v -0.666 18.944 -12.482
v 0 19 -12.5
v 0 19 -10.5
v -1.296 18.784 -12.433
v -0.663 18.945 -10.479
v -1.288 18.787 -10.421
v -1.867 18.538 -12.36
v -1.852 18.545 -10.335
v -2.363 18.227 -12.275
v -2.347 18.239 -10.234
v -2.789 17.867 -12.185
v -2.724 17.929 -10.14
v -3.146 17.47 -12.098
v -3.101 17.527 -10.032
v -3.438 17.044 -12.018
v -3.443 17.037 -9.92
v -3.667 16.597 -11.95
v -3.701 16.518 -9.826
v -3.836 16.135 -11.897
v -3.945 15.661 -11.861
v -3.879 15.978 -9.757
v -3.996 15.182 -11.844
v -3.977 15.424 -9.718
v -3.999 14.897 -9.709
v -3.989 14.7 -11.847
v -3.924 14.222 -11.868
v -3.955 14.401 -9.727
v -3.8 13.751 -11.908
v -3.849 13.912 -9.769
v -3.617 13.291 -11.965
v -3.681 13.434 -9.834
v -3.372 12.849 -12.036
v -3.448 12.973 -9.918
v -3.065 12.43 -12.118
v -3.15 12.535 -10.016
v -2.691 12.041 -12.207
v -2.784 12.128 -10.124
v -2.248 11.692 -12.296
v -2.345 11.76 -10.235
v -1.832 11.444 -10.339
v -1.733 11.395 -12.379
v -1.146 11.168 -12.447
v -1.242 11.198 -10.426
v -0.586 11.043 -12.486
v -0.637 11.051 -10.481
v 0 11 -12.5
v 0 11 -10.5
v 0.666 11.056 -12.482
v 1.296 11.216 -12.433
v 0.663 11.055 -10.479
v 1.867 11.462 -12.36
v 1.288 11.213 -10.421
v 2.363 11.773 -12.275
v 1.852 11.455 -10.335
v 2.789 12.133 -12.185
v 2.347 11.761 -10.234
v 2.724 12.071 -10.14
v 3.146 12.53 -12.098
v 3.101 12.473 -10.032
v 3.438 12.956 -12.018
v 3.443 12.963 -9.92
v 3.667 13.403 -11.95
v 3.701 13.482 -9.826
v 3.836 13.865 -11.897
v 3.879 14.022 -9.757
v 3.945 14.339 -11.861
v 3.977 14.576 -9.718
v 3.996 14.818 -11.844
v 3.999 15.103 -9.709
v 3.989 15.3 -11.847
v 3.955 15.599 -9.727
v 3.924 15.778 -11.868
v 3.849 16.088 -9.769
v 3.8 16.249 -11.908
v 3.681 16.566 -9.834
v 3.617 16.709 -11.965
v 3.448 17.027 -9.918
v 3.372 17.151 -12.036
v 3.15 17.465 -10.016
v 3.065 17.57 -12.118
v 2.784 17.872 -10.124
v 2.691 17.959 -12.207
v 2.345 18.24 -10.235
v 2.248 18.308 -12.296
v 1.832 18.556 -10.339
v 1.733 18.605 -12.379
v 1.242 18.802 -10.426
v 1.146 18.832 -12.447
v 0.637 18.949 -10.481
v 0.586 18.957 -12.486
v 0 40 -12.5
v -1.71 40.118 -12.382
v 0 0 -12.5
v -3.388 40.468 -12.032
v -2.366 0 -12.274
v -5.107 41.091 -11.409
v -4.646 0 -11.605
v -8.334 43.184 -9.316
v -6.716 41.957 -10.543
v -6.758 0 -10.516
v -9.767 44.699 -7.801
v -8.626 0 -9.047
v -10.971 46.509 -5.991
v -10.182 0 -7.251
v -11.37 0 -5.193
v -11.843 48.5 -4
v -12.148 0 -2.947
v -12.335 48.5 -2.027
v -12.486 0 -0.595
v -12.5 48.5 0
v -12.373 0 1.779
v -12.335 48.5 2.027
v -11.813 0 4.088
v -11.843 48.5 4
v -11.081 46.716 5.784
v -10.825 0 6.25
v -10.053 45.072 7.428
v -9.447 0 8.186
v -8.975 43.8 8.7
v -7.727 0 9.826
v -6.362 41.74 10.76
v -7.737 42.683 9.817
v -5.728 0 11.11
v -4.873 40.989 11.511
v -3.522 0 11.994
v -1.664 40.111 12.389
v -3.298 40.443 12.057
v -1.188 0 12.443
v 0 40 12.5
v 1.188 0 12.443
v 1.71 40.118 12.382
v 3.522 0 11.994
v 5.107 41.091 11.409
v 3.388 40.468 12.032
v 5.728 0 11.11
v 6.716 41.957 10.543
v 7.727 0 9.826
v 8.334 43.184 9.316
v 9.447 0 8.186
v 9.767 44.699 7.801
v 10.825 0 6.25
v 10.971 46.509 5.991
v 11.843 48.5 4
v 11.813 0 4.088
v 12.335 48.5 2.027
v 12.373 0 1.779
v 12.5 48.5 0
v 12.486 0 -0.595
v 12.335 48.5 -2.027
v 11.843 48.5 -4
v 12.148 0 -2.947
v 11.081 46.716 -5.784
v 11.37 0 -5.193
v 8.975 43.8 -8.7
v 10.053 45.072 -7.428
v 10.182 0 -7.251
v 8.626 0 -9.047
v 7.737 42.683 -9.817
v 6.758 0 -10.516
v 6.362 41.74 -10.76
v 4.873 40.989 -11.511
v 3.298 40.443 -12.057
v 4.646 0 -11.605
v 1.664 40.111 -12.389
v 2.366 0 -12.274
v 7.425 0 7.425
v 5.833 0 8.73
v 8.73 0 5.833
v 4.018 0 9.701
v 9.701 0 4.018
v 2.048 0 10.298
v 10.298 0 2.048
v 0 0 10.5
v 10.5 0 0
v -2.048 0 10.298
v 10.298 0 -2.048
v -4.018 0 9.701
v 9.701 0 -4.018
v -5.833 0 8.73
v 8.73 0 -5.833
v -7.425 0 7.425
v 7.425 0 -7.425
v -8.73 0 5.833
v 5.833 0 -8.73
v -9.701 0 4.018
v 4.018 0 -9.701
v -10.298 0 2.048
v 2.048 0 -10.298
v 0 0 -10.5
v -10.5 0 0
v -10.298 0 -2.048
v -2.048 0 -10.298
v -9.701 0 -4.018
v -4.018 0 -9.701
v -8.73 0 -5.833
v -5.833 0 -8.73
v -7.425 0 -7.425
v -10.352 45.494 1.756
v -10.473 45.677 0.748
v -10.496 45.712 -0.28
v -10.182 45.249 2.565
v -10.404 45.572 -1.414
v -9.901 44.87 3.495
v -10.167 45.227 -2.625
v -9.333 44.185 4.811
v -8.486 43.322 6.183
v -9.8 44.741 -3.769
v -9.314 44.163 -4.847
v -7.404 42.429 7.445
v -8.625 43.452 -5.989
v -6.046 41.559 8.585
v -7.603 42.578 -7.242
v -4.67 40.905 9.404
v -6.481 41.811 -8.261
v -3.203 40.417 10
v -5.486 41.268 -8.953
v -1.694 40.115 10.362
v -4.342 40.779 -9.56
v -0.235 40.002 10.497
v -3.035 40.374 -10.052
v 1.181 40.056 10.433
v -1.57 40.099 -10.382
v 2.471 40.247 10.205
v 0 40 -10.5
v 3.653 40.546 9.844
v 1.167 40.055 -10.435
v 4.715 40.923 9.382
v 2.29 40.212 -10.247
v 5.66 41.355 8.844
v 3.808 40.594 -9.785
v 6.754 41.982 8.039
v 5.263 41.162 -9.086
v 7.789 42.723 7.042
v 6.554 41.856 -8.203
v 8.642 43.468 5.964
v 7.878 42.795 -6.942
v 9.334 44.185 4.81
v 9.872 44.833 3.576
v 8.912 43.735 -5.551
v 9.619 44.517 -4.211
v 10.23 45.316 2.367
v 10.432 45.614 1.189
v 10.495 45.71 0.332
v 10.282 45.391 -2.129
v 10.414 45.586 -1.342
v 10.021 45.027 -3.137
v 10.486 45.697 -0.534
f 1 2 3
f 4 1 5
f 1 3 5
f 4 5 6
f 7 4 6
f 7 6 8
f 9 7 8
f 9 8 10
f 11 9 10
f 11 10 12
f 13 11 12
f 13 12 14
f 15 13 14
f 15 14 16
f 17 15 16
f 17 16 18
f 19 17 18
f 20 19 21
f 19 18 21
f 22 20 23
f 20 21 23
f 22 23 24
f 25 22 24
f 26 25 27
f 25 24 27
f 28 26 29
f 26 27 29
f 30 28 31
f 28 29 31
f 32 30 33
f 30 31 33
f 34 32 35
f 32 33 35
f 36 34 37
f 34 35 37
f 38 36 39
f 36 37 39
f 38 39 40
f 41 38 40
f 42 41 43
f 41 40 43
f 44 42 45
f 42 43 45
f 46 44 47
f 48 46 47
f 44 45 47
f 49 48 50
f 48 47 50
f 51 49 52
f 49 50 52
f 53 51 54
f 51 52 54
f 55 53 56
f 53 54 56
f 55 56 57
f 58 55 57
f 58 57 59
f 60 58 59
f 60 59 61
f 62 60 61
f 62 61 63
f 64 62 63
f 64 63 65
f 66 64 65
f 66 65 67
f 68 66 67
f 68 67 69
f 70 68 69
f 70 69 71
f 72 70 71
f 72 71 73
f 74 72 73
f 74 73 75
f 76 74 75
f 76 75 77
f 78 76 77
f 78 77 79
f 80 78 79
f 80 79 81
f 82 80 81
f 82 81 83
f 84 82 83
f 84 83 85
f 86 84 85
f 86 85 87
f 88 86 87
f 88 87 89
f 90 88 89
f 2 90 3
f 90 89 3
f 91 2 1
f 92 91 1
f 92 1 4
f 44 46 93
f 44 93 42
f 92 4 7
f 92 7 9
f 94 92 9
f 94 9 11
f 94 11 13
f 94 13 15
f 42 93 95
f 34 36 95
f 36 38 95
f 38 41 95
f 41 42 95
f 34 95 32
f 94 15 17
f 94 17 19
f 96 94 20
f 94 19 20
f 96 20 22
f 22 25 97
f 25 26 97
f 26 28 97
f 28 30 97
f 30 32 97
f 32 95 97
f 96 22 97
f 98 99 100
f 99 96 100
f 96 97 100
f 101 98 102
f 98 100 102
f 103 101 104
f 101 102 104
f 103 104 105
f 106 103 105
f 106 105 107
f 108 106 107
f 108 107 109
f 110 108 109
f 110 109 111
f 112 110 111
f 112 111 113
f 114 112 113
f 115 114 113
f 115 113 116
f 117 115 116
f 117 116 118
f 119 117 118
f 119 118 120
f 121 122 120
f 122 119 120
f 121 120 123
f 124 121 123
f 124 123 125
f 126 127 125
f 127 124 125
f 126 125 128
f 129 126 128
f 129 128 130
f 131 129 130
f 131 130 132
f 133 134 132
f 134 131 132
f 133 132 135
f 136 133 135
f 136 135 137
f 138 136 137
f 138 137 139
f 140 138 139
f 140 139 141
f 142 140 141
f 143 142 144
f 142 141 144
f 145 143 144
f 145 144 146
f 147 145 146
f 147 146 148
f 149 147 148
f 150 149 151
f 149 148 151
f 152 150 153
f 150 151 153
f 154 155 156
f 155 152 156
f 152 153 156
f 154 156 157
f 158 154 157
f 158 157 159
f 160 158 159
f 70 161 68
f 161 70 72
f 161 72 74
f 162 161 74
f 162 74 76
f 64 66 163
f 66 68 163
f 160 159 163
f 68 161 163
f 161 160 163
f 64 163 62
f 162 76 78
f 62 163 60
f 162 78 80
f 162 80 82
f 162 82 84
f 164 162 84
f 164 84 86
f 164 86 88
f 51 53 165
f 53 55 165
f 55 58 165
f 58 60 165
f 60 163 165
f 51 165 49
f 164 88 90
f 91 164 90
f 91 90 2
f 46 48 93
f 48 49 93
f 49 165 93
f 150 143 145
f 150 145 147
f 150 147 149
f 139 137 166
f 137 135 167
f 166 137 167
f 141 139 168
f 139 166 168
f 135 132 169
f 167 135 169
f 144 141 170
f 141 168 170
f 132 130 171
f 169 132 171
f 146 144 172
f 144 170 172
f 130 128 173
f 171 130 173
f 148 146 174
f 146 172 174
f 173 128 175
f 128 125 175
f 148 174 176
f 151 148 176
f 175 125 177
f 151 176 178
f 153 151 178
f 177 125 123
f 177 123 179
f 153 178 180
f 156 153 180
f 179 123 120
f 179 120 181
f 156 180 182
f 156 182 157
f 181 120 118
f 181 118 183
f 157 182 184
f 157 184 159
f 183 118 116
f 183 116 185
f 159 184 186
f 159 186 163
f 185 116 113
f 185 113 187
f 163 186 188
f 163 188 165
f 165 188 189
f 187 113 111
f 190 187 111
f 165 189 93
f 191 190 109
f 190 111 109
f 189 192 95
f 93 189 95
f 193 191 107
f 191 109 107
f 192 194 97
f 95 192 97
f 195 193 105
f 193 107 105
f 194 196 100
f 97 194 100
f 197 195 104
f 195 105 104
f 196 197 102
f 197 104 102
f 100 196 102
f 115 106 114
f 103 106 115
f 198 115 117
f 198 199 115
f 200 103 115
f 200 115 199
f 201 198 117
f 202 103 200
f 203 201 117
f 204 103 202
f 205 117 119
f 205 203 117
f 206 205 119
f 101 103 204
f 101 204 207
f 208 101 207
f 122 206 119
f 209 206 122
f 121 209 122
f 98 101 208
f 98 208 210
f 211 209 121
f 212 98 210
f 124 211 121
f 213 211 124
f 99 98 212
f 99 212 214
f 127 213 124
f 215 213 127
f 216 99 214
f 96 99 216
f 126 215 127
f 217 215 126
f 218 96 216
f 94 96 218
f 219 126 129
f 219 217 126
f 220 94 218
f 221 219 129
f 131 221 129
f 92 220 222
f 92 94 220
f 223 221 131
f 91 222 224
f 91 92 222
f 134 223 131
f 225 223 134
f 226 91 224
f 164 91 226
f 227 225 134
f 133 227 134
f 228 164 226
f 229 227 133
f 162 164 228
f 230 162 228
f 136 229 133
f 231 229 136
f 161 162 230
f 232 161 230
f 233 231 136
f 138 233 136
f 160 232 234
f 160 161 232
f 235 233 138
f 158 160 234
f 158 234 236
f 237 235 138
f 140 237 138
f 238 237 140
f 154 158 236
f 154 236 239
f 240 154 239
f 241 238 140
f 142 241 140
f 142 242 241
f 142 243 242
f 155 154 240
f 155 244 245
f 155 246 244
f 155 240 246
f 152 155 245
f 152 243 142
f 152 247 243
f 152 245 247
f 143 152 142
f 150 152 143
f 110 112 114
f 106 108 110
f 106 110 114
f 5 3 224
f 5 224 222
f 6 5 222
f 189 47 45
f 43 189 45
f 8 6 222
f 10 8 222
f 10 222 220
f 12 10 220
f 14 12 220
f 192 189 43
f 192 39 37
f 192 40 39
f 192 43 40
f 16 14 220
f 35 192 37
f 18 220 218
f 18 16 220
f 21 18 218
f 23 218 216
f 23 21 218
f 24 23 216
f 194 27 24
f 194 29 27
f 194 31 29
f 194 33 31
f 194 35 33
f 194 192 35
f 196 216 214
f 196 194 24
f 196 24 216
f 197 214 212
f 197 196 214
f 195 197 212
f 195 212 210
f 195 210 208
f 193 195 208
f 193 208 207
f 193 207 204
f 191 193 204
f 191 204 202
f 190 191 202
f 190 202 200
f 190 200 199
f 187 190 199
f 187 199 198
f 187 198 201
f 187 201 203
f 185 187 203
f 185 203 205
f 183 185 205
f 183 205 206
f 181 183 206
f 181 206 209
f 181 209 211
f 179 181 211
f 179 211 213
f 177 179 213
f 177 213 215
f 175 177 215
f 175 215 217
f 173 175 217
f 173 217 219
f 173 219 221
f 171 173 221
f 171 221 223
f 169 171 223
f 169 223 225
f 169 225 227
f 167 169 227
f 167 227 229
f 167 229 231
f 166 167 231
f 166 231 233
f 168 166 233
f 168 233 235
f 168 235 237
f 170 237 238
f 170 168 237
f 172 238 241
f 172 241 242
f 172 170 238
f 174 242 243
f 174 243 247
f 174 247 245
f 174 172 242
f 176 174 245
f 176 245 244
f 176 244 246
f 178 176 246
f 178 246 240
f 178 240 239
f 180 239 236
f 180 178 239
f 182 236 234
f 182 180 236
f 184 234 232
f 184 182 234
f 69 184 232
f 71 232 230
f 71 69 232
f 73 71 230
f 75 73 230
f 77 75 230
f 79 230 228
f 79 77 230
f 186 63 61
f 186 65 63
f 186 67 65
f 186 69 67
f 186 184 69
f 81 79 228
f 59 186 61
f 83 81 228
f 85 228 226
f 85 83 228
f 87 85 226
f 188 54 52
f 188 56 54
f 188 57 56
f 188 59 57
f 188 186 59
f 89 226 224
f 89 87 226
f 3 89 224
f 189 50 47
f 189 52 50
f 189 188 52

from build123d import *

# Parameters (mm, degrees)
SKETCH_1_R               = 12.5
SKETCH_1_R_2             = 10.5
EXTRUDE_1_DEPTH          = 48.5
CUT_EXTRUDE_1_DEPTH      = 52.621216568
CUT_EXTRUDE_1_DEPTH_BACK = 52.621216568
SKETCH_2_R               = 12.5
SKETCH_3_R               = 4
CUT_EXTRUDE_2_DEPTH      = 52.621216687


with BuildPart() as part:
    # Эскиз1 → Бобышка-Вытянуть1 (new body)
    with BuildSketch(Plane(origin=(0, 0, 0), x_dir=(1, 0, 0), z_dir=(0, 1, 0))):
        with Locations(Location((0, 0, 0), (0, 0, 90))):
            Circle(SKETCH_1_R)
        with Locations(Location((0, 0, 0), (0, 0, 90))):
            Circle(SKETCH_1_R_2, mode=Mode.SUBTRACT)
    extrude(amount=EXTRUDE_1_DEPTH)

    # Эскиз2 → Вырез-Вытянуть1 (cut, two sides: drawn at the far end of the back side and taken through both)
    with BuildSketch(Plane.XY.offset(-CUT_EXTRUDE_1_DEPTH_BACK)):
        with Locations((0, 52.5)):
            Circle(SKETCH_2_R)
    extrude(amount=CUT_EXTRUDE_1_DEPTH + CUT_EXTRUDE_1_DEPTH_BACK, mode=Mode.SUBTRACT)

    # Эскиз3 → Вырез-Вытянуть2 (cut, through all)
    with BuildSketch(Plane.XY):
        with Locations(Location((0, 15, 0), (0, 0, 90))):
            Circle(SKETCH_3_R)
    extrude(amount=-CUT_EXTRUDE_2_DEPTH, mode=Mode.SUBTRACT)


solid = part.part
